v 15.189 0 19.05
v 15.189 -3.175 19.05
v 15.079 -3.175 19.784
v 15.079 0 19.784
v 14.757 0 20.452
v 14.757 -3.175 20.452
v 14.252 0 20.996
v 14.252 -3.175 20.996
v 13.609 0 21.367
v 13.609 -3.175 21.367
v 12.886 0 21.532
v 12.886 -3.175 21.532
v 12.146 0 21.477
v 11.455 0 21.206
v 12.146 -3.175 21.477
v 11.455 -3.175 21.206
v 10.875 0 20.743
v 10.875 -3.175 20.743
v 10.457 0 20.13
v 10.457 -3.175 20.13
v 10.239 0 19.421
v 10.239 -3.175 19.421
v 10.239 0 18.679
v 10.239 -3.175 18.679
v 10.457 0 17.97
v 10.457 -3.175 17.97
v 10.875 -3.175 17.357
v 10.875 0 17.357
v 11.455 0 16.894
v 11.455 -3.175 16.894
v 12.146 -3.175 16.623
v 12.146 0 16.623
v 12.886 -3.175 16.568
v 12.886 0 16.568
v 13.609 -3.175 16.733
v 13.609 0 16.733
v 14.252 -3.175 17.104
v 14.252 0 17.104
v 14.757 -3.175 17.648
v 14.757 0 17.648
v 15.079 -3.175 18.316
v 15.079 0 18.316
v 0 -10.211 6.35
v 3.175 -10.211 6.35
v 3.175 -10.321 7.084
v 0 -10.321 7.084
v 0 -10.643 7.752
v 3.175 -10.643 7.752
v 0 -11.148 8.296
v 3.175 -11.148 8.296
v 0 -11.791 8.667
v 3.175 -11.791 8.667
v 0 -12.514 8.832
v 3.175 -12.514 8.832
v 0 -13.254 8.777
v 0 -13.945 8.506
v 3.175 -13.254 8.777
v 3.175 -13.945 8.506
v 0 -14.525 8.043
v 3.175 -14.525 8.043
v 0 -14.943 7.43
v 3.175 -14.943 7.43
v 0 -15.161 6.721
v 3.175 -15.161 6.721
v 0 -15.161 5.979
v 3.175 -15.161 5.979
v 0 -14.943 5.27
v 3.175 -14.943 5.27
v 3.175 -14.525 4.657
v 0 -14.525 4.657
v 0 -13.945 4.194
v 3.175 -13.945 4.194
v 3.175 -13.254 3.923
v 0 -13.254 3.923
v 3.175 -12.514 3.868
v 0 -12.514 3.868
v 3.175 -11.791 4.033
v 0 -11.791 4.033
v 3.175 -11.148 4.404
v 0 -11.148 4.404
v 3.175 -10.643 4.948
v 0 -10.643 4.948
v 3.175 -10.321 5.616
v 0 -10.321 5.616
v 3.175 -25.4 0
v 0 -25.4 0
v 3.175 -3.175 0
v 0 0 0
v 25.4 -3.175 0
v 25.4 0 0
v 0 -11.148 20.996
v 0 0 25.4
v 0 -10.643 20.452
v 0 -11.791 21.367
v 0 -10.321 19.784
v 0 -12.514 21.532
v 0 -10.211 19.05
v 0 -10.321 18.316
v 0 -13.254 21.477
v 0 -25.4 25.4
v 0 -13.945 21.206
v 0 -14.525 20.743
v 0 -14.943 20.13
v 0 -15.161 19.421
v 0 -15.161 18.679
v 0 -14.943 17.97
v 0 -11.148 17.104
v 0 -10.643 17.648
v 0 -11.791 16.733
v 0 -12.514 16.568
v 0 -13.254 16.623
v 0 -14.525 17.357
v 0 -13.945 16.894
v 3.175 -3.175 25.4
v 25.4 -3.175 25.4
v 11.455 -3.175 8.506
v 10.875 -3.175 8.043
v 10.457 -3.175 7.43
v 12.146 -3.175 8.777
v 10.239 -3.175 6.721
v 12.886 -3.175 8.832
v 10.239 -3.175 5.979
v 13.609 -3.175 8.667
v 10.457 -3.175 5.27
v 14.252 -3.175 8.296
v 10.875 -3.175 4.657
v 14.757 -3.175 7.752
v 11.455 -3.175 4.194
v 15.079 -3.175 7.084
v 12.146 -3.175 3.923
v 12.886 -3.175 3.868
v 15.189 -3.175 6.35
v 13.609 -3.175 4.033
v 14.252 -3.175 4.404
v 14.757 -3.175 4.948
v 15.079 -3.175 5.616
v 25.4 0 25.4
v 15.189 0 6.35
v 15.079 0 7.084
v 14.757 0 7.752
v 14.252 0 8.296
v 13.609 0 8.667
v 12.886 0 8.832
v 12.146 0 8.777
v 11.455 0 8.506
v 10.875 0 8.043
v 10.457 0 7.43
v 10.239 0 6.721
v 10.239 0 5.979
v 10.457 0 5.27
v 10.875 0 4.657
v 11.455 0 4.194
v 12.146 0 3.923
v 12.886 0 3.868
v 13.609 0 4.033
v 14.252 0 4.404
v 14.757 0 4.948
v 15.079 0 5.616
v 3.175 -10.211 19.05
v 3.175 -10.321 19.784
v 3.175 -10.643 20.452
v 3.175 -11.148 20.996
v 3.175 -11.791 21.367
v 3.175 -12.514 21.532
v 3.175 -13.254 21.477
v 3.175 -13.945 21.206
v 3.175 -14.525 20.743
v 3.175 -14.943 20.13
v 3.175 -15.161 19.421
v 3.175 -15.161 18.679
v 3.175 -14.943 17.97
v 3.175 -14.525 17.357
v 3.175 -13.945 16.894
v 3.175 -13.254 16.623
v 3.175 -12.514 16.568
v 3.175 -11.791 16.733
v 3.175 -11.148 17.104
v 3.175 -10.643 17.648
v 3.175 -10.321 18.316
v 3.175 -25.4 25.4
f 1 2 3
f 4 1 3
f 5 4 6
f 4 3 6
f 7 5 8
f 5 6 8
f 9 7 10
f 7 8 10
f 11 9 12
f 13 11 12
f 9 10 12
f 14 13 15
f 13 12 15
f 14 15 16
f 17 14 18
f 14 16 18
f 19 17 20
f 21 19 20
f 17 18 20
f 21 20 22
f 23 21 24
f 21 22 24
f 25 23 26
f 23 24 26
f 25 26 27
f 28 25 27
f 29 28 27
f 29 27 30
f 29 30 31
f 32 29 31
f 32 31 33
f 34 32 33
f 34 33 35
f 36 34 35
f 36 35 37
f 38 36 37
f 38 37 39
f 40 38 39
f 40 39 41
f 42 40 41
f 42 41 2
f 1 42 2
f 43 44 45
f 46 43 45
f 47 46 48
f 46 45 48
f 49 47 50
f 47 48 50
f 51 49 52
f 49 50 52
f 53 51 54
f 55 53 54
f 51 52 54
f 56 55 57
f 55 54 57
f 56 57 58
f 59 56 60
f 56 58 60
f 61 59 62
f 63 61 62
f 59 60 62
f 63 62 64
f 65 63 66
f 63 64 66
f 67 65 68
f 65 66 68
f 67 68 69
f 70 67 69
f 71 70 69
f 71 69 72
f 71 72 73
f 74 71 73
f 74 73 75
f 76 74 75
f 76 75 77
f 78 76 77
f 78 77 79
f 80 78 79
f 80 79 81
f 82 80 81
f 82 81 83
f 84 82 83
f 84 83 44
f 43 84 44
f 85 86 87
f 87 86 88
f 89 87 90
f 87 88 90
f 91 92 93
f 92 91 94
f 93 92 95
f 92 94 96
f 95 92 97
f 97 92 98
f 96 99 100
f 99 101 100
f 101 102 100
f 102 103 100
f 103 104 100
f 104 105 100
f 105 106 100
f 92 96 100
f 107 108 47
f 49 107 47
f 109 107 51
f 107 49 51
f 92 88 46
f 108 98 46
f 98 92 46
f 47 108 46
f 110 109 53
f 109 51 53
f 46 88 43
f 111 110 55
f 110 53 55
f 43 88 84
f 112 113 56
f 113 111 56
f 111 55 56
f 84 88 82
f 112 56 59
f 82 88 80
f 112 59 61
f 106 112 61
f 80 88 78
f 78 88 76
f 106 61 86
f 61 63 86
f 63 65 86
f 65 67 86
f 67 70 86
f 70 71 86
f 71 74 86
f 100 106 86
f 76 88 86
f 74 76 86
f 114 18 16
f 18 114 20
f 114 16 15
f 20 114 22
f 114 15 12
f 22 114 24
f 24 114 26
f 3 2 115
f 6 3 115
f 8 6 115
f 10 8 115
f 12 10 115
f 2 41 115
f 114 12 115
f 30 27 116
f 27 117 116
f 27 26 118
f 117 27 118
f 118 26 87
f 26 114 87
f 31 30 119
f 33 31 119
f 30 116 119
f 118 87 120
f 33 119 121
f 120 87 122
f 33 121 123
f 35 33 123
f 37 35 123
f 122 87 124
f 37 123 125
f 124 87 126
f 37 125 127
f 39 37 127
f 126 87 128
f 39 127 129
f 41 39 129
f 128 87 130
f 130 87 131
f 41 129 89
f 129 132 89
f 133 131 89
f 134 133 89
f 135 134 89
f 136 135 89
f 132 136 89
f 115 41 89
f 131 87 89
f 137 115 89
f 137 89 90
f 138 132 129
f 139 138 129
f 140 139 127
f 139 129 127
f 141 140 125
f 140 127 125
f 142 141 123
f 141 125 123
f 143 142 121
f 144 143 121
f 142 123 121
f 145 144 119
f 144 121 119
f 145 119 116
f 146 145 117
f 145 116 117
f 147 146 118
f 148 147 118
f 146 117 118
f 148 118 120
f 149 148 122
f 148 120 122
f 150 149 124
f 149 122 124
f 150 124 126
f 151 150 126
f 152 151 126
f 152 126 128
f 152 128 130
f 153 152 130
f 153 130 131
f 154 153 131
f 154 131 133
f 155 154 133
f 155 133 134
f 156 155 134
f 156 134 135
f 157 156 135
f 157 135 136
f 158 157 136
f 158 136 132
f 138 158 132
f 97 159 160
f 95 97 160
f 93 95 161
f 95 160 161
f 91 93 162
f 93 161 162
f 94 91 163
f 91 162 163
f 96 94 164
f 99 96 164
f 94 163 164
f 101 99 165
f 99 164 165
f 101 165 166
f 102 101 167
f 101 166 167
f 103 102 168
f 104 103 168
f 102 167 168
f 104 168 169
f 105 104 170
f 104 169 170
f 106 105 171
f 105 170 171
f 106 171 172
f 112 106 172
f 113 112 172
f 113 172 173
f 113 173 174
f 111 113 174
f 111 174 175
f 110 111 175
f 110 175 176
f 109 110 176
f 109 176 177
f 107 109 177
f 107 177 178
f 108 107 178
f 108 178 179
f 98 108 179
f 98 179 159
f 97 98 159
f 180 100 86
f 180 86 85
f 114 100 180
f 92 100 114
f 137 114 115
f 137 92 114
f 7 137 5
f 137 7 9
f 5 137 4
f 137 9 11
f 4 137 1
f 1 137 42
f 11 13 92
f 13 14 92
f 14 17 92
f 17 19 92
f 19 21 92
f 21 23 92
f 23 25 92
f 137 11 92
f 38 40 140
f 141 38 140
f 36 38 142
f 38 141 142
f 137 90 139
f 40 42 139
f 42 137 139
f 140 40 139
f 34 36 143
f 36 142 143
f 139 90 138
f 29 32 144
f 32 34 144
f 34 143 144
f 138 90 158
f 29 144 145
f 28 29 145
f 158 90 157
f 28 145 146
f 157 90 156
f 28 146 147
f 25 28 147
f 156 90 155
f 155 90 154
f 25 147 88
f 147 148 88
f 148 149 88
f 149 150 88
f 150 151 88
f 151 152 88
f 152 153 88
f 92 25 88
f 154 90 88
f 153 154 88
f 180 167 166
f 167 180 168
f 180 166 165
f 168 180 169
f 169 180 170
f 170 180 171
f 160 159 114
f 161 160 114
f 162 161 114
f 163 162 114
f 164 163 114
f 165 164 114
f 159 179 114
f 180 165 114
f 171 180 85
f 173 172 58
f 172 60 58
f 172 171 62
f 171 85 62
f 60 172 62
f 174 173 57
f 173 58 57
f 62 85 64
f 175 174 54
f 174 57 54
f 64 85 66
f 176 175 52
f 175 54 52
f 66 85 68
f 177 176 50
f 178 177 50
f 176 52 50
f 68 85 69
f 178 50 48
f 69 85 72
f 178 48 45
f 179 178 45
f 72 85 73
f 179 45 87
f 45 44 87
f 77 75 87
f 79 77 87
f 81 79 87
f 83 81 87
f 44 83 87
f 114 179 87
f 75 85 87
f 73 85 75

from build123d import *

# Parameters (mm, degrees)
BOSS_EXTRUDE1_DEPTH = 25.4
SKETCH5_R           = 2.4892
CUT_EXTRUDE1_DEPTH  = 43.240627659
SKETCH6_R           = 2.4892
CUT_EXTRUDE2_DEPTH  = 43.240627659


with BuildPart() as part:
    # Sketch2 → Boss-Extrude1 (new body)
    with BuildSketch(Plane.XY):
        Polygon((0, 0), (0, -25.4), (3.175, -25.4), (3.175, -3.175), (25.4, -3.175), (25.4, 0), align=None)
    extrude(amount=BOSS_EXTRUDE1_DEPTH)

    # Sketch5 → Cut-Extrude1 (cut, through all)
    with BuildSketch(Plane(origin=(3.175, 0, 0), x_dir=(0, 0, -1), z_dir=(1, 0, 0))):
        with Locations(Location((-6.35, -12.7, 0), (0, 0, 90))):
            Circle(SKETCH5_R)
        with Locations(Location((-19.05, -12.7, 0), (0, 0, 90))):
            Circle(SKETCH5_R)
        with Locations((-31.75, -12.7)):
            Circle(SKETCH5_R)
        with Locations((-44.45, -12.7)):
            Circle(SKETCH5_R)
    extrude(amount=-CUT_EXTRUDE1_DEPTH, mode=Mode.SUBTRACT)

    # Sketch6 → Cut-Extrude2 (cut, through all)
    with BuildSketch(Plane.XZ.offset(3.175)):
        with Locations((12.7, 6.35)):
            Circle(SKETCH6_R)
        with Locations((12.7, 19.05)):
            Circle(SKETCH6_R)
        with Locations((12.7, 31.75)):
            Circle(SKETCH6_R)
        with Locations((12.7, 44.45)):
            Circle(SKETCH6_R)
    extrude(amount=-CUT_EXTRUDE2_DEPTH, mode=Mode.SUBTRACT)


solid = part.part
